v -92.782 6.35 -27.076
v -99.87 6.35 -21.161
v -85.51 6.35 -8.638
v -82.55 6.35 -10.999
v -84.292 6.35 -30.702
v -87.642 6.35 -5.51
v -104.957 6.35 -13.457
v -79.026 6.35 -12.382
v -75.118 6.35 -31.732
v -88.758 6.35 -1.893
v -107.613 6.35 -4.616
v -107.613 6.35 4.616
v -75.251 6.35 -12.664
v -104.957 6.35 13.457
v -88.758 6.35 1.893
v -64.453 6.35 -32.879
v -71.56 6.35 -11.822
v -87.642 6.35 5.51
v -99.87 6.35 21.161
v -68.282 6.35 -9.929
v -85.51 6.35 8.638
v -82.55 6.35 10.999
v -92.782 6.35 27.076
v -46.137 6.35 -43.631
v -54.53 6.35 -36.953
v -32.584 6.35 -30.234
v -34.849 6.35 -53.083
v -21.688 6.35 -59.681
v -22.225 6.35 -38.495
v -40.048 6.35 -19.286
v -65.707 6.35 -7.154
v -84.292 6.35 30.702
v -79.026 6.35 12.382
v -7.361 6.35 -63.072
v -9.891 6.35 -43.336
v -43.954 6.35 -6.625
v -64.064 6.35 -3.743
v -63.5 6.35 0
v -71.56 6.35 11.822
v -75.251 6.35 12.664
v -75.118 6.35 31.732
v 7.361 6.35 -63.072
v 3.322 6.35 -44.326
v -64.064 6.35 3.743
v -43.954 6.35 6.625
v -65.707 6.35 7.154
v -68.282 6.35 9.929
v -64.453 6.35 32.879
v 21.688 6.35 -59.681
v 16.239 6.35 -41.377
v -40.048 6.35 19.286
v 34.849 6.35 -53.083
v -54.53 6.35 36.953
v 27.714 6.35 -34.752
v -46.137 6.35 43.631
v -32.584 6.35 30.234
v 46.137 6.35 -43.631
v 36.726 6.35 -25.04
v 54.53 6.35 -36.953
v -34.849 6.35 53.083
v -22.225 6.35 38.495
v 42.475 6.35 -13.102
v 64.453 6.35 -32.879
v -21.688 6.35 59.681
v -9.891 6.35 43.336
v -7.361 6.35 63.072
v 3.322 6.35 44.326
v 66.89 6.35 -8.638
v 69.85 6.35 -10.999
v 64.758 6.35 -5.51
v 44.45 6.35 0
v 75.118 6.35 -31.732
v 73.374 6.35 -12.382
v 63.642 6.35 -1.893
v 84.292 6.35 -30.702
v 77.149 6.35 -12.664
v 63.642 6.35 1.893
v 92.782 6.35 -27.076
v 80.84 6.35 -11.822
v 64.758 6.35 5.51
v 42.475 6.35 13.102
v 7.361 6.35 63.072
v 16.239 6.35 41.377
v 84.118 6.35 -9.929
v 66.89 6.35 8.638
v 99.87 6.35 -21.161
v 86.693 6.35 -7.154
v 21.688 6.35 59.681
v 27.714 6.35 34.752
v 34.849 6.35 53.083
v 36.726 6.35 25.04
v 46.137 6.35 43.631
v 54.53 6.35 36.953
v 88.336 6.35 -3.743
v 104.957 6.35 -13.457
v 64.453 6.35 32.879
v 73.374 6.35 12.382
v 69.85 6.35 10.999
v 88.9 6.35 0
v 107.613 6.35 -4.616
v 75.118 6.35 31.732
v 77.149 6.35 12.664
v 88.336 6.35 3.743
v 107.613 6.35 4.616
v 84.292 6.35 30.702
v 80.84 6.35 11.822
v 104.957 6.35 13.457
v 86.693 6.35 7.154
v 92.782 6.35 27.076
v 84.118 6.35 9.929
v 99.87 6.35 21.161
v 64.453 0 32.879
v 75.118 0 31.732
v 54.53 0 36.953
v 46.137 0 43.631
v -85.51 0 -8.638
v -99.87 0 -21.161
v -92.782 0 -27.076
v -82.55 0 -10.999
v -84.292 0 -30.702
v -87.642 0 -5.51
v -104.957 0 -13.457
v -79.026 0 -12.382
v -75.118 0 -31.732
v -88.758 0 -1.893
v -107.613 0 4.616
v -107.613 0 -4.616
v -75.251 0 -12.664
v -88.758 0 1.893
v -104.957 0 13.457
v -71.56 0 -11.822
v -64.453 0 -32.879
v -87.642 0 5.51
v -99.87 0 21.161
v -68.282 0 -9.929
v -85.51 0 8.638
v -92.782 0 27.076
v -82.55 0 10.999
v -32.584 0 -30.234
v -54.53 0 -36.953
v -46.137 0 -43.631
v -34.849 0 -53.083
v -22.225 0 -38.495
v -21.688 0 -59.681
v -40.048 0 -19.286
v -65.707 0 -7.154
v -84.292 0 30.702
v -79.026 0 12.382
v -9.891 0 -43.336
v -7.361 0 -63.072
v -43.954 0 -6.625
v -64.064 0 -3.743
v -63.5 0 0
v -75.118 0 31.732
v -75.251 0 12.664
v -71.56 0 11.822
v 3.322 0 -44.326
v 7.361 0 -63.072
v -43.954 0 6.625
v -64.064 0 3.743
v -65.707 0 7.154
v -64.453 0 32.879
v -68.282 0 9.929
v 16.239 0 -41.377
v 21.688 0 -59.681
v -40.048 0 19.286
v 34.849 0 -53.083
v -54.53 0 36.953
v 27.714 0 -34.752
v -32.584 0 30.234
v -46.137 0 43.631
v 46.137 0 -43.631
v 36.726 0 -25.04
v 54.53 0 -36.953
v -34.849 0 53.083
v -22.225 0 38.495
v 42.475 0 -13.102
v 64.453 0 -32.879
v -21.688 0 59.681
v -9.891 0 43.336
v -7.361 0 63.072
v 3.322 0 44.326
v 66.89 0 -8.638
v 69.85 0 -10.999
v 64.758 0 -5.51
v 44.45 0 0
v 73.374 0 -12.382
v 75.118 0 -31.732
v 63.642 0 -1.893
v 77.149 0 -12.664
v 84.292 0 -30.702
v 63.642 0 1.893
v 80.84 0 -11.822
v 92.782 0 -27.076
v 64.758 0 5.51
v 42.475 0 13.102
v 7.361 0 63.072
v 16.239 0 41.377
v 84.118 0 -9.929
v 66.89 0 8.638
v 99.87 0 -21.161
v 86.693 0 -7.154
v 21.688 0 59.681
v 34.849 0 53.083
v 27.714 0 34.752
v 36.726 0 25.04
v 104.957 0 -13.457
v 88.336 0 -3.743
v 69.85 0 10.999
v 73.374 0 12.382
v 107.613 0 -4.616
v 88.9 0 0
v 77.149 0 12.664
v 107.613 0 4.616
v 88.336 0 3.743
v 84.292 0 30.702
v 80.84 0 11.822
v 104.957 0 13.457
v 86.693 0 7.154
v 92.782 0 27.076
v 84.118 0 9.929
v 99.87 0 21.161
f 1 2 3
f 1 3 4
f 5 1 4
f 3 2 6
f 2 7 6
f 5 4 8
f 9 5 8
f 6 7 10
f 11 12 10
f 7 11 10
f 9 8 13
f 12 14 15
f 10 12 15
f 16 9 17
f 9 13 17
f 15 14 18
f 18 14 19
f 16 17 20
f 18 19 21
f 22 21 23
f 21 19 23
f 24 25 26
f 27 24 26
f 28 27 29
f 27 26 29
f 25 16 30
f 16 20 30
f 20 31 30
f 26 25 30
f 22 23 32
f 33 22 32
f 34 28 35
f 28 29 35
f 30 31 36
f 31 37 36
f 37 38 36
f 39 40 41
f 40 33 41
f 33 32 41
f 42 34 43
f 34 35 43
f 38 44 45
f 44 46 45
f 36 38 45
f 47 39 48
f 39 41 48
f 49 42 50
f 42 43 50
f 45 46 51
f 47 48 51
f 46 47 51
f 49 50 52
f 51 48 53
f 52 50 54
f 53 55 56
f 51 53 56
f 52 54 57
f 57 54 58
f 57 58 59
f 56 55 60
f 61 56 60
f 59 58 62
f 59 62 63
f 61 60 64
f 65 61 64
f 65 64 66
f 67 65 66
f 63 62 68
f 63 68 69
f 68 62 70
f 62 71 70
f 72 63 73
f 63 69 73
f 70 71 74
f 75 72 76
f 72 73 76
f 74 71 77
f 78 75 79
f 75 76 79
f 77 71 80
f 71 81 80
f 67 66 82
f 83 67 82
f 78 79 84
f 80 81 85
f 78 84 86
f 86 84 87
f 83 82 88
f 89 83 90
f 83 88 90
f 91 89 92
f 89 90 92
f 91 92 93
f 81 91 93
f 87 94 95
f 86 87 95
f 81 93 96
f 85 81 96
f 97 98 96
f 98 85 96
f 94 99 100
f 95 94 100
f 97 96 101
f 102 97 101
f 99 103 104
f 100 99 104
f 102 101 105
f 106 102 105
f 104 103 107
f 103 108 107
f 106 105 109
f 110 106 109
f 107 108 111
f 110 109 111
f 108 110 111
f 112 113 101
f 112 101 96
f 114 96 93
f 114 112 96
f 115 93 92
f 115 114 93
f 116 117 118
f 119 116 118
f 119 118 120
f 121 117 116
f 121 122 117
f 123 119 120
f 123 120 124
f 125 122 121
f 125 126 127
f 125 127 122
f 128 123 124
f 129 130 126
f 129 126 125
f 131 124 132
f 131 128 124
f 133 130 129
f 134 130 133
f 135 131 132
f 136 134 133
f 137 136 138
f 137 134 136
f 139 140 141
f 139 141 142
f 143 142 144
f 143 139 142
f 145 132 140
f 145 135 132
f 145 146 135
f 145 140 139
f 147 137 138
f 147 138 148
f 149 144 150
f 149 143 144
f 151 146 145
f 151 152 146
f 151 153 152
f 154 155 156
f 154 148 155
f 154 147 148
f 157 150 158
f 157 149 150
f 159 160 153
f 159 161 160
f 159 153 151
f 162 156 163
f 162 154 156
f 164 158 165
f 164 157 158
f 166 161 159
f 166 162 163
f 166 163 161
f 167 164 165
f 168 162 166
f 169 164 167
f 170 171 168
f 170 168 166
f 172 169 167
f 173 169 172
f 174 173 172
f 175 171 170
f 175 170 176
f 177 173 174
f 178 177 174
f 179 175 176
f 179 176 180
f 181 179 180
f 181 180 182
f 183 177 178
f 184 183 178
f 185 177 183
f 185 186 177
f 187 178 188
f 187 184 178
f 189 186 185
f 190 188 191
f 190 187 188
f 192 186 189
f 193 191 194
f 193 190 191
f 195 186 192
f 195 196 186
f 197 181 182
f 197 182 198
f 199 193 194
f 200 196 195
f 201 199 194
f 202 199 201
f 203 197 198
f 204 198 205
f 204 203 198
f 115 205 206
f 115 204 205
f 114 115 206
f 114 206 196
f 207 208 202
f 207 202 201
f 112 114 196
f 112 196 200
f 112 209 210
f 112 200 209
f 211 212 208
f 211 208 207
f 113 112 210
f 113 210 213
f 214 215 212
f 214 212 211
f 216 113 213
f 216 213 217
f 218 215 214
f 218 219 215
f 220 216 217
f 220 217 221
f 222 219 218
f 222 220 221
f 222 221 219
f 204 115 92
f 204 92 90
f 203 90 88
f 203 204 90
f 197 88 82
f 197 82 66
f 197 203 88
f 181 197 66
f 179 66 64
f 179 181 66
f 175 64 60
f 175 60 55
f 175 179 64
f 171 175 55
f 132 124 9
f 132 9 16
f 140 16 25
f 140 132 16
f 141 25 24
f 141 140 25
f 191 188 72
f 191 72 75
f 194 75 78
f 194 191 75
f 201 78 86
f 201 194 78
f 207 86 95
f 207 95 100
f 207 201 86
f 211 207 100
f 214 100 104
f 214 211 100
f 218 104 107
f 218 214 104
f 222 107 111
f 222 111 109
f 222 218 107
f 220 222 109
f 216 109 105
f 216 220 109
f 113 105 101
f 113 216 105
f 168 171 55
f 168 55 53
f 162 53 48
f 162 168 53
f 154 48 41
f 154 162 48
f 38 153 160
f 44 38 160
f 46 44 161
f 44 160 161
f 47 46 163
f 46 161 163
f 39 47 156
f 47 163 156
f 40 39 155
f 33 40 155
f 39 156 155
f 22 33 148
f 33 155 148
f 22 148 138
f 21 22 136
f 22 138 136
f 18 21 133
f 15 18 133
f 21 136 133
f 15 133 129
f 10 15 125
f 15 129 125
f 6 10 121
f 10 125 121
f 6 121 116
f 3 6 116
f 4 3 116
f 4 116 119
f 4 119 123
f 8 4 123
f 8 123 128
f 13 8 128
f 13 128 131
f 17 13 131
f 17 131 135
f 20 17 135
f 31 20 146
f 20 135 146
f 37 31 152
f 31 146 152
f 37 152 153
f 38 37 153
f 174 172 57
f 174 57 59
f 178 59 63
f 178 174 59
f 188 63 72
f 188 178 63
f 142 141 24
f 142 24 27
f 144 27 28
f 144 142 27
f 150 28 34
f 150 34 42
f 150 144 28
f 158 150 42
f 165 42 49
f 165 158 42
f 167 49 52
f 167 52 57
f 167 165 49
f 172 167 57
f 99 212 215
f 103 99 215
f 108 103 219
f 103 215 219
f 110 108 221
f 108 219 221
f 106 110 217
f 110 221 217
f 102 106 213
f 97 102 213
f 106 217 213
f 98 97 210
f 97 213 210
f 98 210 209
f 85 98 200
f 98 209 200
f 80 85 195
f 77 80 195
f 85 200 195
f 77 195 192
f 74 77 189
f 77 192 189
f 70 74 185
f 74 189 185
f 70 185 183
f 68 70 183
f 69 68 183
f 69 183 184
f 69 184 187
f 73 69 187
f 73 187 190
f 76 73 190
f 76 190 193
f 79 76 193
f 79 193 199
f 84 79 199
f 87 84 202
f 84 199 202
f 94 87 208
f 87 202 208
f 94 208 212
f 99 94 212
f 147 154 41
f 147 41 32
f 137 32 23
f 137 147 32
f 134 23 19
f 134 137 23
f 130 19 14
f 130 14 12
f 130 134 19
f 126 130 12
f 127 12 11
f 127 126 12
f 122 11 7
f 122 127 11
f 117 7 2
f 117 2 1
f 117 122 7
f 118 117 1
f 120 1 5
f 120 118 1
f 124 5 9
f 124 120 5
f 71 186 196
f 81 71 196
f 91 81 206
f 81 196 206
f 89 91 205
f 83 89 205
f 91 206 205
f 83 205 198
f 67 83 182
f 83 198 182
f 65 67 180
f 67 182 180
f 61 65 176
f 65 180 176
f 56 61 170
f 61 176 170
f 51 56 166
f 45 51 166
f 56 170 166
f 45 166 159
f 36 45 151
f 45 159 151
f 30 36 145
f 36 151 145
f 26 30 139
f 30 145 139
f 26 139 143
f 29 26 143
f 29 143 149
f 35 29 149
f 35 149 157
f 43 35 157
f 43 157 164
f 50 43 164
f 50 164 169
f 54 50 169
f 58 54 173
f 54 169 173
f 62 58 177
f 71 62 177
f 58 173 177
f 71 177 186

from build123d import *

# Parameters (mm, degrees)
F0_R     = 12.7
F0_R_2   = 44.45
F1_DEPTH = 6.35


with BuildPart() as f1:
    # F0 (on Front) → F1 (new body)
    with BuildSketch(Plane.XZ):
        with BuildLine():
            ThreePointArc((-75.117614, -31.731545), (-59.347524, -34.564632), (-46.136719, -43.630874))
            ThreePointArc((-46.136719, -43.630874), (0, -63.5), (46.136719, -43.630874))
            ThreePointArc((46.136719, -43.630874), (59.347524, -34.564632), (75.117614, -31.731545))
            ThreePointArc((75.117614, -31.731545), (107.95, 0), (75.117614, 31.731545))
            ThreePointArc((75.117614, 31.731545), (59.347524, 34.564632), (46.136719, 43.630874))
            ThreePointArc((46.136719, 43.630874), (0, 63.5), (-46.136719, 43.630874))
            ThreePointArc((-46.136719, 43.630874), (-59.347524, 34.564632), (-75.117614, 31.731545))
            ThreePointArc((-75.117614, 31.731545), (-107.95, 0), (-75.117614, -31.731545))
        make_face()
        with Locations((-76.2, 0)):
            Circle(F0_R, mode=Mode.SUBTRACT)
        Circle(F0_R_2, mode=Mode.SUBTRACT)
        with Locations((76.2, 0)):
            Circle(F0_R, mode=Mode.SUBTRACT)
    extrude(amount=-F1_DEPTH)


solid = f1.part
